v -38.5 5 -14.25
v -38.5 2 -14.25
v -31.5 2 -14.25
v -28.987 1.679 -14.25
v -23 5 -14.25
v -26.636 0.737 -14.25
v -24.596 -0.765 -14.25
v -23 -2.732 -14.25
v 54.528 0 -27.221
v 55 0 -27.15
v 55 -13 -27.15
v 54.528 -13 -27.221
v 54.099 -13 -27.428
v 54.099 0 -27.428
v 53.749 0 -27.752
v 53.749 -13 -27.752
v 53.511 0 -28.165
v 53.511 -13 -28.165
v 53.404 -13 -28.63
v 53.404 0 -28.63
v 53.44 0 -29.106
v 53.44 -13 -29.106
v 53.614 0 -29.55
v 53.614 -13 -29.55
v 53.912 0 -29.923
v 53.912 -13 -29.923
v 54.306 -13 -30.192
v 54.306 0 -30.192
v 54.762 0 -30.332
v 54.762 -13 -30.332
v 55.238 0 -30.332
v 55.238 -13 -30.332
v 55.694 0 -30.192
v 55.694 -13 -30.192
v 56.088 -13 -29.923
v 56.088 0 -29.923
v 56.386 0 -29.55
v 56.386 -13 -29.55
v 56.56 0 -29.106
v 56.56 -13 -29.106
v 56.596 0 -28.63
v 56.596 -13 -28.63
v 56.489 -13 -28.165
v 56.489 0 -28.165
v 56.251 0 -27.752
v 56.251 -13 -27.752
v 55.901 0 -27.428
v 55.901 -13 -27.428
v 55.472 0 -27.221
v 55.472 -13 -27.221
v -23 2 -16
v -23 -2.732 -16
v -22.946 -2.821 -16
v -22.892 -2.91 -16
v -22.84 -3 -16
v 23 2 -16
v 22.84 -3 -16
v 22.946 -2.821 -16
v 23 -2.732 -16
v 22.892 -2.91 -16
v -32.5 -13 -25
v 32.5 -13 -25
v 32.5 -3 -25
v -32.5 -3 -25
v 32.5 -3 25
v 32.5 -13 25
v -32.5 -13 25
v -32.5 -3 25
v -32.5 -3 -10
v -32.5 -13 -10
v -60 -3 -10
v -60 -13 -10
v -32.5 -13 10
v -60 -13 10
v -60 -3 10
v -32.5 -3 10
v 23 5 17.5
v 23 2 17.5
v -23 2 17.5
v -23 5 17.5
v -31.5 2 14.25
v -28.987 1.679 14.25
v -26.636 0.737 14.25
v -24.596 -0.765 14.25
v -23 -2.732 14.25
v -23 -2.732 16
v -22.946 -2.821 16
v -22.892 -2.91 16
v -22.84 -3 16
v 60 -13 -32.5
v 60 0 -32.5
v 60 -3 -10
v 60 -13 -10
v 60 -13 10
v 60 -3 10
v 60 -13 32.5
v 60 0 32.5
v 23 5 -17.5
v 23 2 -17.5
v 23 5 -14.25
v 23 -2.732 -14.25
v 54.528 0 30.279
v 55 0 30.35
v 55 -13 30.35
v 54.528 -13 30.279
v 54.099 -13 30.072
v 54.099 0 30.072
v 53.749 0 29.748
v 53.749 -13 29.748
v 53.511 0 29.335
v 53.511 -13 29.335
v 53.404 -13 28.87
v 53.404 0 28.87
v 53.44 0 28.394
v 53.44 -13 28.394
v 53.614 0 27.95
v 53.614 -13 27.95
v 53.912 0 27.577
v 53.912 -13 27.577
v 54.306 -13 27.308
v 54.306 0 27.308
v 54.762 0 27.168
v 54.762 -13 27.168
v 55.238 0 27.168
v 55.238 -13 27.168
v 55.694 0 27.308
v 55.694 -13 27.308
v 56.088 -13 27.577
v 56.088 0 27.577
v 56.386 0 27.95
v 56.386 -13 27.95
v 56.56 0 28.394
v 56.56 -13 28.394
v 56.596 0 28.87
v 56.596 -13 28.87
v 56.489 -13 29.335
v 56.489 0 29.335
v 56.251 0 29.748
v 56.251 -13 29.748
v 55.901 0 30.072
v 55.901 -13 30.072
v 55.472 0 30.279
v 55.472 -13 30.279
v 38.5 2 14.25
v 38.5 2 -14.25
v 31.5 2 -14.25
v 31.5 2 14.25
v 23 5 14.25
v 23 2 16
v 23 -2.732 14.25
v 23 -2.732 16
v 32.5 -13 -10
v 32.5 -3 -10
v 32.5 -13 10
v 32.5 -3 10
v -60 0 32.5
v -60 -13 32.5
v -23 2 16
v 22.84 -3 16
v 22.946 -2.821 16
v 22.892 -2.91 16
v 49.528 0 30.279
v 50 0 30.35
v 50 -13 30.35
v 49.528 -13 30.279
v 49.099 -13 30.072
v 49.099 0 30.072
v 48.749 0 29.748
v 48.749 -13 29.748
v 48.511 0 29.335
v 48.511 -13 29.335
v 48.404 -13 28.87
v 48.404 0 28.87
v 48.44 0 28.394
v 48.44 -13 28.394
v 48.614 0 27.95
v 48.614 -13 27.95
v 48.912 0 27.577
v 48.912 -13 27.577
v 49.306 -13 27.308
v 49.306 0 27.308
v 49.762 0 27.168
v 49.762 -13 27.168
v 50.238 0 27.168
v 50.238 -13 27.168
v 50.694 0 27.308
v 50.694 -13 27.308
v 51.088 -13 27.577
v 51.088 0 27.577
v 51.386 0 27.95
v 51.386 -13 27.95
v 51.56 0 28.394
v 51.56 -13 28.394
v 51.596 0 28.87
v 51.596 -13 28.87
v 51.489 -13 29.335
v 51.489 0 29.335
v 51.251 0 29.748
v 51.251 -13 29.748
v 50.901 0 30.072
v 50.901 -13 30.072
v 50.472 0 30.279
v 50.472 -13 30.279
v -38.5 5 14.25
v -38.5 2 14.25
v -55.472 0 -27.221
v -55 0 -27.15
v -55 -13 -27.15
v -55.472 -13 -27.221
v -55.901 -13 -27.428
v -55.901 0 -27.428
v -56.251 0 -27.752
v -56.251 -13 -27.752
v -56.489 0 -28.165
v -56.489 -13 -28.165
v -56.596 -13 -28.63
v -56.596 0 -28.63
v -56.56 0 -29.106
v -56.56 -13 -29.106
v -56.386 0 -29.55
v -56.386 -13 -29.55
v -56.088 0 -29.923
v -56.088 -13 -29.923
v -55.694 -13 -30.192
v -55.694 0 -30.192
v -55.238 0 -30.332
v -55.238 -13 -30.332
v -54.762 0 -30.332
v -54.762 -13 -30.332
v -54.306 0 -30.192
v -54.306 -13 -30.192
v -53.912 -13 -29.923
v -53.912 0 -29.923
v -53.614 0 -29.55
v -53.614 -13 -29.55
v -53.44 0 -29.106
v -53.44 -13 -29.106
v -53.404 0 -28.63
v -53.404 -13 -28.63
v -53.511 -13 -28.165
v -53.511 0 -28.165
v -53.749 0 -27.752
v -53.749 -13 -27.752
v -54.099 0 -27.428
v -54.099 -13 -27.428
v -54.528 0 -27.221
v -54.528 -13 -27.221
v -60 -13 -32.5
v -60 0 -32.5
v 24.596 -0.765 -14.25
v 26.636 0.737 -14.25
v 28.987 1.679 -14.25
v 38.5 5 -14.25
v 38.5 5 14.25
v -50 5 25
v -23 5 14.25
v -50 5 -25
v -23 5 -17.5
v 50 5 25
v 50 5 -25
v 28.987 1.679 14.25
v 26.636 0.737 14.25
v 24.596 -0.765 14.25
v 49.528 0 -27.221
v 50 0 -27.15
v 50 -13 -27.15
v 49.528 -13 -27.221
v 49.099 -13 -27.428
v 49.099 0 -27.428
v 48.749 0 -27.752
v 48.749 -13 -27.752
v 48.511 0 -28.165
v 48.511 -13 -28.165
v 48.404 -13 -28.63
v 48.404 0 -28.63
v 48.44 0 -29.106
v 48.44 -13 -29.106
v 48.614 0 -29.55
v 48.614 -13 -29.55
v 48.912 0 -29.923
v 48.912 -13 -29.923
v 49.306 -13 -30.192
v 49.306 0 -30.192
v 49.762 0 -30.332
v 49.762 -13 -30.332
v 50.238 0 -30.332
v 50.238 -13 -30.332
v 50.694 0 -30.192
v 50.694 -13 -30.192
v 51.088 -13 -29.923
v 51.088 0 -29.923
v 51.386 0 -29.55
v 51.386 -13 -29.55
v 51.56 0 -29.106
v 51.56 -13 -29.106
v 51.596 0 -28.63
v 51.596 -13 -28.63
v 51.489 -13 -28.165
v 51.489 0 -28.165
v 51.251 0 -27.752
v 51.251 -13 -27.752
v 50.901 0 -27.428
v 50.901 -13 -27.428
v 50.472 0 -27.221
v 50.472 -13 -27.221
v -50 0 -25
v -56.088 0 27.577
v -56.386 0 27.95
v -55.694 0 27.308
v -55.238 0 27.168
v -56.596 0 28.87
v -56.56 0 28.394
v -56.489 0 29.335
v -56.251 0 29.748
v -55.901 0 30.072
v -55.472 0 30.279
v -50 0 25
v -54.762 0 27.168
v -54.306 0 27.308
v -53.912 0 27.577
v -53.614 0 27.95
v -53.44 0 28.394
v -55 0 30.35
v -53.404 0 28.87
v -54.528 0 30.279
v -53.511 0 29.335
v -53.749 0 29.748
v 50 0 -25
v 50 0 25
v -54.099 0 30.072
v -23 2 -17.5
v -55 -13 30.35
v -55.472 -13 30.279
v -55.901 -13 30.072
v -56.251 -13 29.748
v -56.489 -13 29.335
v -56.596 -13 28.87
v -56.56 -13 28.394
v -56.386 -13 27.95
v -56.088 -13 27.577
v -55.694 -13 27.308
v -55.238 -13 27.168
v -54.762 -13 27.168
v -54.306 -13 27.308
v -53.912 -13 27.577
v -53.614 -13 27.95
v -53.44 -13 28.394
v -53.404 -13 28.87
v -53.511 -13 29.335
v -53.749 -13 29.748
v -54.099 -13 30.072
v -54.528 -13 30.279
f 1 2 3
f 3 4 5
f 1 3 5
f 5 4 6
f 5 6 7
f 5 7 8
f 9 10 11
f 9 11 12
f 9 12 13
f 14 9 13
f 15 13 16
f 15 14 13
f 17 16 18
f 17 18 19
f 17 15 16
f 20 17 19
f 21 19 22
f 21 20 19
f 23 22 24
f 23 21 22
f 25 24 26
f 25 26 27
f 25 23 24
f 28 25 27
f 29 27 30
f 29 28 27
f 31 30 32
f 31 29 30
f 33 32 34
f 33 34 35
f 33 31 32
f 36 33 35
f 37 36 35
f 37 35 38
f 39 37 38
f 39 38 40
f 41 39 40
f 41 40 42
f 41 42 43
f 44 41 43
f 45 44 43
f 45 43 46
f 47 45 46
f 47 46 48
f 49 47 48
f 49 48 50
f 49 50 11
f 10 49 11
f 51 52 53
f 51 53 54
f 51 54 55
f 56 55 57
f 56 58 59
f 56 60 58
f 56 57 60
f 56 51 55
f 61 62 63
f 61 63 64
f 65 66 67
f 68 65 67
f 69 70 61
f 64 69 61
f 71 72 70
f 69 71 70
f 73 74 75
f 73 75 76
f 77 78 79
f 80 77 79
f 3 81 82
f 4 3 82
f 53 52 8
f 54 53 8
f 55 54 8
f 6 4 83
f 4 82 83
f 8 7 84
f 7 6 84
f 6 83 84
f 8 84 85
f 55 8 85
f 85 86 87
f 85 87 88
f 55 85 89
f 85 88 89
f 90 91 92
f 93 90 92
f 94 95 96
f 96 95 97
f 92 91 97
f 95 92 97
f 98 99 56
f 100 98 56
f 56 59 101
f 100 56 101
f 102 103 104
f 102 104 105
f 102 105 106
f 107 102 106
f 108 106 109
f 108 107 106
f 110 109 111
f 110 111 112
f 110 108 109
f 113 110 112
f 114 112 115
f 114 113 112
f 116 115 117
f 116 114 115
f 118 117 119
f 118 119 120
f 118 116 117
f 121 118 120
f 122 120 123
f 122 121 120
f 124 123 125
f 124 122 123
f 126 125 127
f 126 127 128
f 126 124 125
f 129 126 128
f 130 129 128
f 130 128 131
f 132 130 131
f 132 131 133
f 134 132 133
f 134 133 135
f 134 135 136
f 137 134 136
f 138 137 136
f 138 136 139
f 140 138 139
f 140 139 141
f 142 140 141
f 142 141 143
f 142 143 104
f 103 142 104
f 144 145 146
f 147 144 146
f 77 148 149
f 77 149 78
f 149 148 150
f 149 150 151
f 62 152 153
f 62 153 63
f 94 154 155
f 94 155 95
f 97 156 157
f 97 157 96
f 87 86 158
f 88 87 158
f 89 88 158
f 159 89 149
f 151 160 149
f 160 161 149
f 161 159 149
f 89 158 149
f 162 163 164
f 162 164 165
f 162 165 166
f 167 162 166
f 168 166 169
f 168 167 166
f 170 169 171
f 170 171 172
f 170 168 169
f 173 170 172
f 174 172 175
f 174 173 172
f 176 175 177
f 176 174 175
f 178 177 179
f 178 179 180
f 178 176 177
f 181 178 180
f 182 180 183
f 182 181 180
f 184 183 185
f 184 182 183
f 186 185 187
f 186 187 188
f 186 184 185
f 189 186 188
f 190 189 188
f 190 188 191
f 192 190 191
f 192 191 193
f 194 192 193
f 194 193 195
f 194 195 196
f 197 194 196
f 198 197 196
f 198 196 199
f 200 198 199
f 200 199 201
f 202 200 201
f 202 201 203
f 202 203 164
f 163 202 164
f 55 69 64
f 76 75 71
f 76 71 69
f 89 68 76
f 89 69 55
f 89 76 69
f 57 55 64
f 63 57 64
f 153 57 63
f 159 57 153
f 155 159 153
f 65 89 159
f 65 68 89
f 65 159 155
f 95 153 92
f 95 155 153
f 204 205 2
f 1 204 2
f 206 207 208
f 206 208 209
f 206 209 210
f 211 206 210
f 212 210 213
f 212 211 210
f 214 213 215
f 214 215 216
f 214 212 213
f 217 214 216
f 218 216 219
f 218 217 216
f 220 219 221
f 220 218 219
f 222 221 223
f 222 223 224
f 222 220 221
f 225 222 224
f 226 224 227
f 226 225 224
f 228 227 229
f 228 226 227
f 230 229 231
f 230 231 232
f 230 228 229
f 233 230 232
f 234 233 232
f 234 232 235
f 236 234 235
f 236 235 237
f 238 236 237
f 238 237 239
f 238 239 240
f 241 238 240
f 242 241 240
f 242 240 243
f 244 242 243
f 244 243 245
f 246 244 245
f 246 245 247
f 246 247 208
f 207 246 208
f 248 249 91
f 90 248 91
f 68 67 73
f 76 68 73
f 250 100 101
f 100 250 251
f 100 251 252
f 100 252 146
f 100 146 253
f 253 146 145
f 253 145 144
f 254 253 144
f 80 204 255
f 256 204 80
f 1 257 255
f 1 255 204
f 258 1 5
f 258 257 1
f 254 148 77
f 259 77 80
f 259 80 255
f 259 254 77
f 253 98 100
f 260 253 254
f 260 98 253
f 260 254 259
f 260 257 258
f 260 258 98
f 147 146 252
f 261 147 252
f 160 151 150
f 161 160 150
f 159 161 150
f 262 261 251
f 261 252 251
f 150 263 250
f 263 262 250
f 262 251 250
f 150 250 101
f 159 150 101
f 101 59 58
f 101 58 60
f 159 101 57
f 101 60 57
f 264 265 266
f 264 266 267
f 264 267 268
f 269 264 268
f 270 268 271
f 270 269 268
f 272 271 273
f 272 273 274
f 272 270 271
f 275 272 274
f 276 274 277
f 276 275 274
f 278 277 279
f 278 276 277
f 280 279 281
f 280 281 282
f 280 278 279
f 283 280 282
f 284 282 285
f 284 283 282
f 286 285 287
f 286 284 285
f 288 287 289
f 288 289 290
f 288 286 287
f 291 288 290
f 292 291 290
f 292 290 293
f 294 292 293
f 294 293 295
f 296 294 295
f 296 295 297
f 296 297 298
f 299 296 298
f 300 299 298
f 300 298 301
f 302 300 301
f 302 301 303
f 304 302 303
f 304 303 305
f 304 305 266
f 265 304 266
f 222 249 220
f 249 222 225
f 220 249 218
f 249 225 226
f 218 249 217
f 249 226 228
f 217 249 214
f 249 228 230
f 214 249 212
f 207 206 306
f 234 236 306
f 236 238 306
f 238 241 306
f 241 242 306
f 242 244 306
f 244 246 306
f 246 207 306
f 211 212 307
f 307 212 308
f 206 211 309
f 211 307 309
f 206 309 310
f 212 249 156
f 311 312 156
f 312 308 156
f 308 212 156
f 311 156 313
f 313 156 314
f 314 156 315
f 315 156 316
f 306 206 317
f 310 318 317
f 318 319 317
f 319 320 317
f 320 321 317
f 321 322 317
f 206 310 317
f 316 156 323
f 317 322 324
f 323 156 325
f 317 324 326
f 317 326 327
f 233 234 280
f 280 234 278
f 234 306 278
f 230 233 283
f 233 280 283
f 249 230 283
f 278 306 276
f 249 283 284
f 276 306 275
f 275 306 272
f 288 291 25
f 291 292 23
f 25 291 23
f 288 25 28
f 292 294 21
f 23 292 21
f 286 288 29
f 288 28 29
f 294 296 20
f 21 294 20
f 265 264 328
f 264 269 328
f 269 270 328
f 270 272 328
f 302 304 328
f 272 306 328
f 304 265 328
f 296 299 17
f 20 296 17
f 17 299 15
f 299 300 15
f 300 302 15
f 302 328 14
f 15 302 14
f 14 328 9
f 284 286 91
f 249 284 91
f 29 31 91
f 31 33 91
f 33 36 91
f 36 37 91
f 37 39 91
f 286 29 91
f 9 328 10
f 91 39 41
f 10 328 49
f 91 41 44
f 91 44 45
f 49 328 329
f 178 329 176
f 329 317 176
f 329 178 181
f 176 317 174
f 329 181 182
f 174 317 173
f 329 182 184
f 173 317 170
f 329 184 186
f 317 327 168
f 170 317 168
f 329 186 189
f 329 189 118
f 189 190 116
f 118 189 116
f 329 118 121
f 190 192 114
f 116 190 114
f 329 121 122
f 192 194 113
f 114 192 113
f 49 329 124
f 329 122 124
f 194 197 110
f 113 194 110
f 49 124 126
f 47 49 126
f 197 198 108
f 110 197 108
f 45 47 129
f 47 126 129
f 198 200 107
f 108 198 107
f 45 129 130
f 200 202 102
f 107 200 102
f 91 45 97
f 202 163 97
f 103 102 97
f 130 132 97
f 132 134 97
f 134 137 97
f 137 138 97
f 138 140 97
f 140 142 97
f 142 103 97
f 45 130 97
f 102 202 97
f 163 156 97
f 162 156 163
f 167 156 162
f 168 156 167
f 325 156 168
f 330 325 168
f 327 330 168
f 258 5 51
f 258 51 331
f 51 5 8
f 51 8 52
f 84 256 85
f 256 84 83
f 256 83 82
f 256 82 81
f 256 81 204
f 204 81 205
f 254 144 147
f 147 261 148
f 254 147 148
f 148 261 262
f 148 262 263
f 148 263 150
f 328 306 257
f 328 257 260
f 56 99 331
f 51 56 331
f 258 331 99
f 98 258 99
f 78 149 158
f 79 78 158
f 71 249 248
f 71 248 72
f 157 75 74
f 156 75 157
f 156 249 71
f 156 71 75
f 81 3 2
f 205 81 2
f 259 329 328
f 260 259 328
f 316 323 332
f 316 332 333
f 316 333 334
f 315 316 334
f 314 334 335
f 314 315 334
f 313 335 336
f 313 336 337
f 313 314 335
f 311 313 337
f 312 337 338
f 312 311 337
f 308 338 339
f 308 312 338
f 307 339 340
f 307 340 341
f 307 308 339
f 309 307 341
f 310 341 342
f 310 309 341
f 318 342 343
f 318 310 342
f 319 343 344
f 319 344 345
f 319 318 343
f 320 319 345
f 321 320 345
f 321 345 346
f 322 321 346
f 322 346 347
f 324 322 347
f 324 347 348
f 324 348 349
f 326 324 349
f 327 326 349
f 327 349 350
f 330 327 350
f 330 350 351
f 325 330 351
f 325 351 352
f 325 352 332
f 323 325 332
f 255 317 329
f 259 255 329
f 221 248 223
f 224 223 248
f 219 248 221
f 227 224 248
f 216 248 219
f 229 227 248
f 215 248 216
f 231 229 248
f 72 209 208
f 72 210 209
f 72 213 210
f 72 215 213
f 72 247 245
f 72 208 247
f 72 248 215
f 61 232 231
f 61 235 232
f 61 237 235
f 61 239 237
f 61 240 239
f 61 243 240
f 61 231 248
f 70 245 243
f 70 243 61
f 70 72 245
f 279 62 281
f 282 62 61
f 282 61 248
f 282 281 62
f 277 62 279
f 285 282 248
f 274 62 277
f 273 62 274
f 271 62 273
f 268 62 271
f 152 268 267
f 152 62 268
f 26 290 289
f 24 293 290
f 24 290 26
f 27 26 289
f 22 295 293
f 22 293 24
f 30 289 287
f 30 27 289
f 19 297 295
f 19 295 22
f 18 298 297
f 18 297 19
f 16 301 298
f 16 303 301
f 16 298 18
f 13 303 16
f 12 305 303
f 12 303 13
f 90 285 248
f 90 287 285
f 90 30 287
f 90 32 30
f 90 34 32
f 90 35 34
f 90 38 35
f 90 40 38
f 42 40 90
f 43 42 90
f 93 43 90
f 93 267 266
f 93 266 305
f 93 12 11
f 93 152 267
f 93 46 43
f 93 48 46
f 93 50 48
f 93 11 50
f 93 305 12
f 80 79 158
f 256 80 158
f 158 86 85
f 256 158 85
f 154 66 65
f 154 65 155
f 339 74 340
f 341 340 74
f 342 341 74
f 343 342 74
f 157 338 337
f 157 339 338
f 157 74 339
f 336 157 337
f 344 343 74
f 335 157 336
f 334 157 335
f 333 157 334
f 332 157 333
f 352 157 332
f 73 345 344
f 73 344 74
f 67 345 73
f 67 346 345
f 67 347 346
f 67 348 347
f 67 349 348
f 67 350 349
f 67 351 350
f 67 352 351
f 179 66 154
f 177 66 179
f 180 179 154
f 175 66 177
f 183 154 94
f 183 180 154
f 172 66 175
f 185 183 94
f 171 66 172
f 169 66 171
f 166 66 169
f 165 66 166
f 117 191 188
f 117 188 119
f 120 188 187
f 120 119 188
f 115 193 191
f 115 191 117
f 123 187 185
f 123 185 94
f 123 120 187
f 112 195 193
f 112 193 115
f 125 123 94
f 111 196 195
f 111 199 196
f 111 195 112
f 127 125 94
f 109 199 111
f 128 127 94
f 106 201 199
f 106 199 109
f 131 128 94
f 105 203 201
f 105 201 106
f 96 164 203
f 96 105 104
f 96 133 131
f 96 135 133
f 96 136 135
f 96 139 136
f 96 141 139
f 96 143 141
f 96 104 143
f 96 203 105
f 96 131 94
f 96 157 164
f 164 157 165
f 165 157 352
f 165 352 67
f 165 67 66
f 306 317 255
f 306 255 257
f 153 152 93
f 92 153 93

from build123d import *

# Parameters (mm, degrees)
BOSS_EXTRUDE3_DEPTH = 2
SKETCH1_6_W         = 100
SKETCH1_6_H         = 50
BOSS_EXTRUDE4_DEPTH = 5
SKETCH2_W           = 120
SKETCH2_H           = 65
SKETCH2_R           = 1.6
BOSS_EXTRUDE5_DEPTH = 13
SKETCH2_2_W         = 120
SKETCH2_2_H         = 65
SKETCH2_2_R         = 1.6
BOSS_EXTRUDE6_DEPTH = 3
CUT_EXTRUDE1_REACH  = 71.866
SKETCH7_W           = 43
SKETCH7_H           = 32
FILLET1_R           = 10
SKETCH8_W           = 38.5
SKETCH8_H           = 20
CUT_EXTRUDE2_DEPTH  = 10
SKETCH9_W           = 65
SKETCH9_H           = 50
CUT_EXTRUDE3_DEPTH  = 10


with BuildPart() as part:
    # Sketch1 → Boss-Extrude3 (new body)
    with BuildSketch(Plane(origin=(0, 0, 0), x_dir=(1, 0, 0), z_dir=(0, 1, 0))):
        Polygon((23, -14.25), (23, -17.5), (-23, -17.5), (-23, -14.25), (-38.5, -14.25), (-38.5, 14.25), (-23, 14.25), (-23, 17.5), (23, 17.5), (23, 14.25), (38.5, 14.25), (38.5, -14.25), align=None)
    extrude(amount=BOSS_EXTRUDE3_DEPTH)

    # Sketch1<6> → Boss-Extrude4 (add)
    with BuildSketch(Plane(origin=(0, 0, 0), x_dir=(1, 0, 0), z_dir=(0, 1, 0))):
        Rectangle(SKETCH1_6_W, SKETCH1_6_H)
        Polygon((23, -14.25), (23, -17.5), (-23, -17.5), (-23, -14.25), (-38.5, -14.25), (-38.5, 14.25), (-23, 14.25), (-23, 17.5), (23, 17.5), (23, 14.25), (38.5, 14.25), (38.5, -14.25), align=None, mode=Mode.SUBTRACT)
    extrude(amount=BOSS_EXTRUDE4_DEPTH)

    # Sketch2 → Boss-Extrude5 (add)
    with BuildSketch(Plane.XZ):
        Rectangle(SKETCH2_W, SKETCH2_H)
        with Locations(Location((-55, 28.75, 0), (0, 0, 90))):
            Circle(SKETCH2_R, mode=Mode.SUBTRACT)
        with Locations(Location((55, 28.75, 0), (0, 0, 90))):
            Circle(SKETCH2_R, mode=Mode.SUBTRACT)
        with Locations(Location((55, -28.75, 0), (0, 0, 90))):
            Circle(SKETCH2_R, mode=Mode.SUBTRACT)
        with Locations(Location((-55, -28.75, 0), (0, 0, 90))):
            Circle(SKETCH2_R, mode=Mode.SUBTRACT)
        with Locations(Location((50, 28.75, 0), (0, 0, 90))):
            Circle(SKETCH2_R, mode=Mode.SUBTRACT)
        with Locations(Location((50, -28.75, 0), (0, 0, 90))):
            Circle(SKETCH2_R, mode=Mode.SUBTRACT)
    extrude(amount=BOSS_EXTRUDE5_DEPTH)

    # Sketch2<2> → Boss-Extrude6 (add)
    with BuildSketch(Plane.XZ):
        Rectangle(SKETCH2_2_W, SKETCH2_2_H)
        with Locations(Location((-55, 28.75, 0), (0, 0, 90))):
            Circle(SKETCH2_2_R, mode=Mode.SUBTRACT)
        with Locations(Location((55, 28.75, 0), (0, 0, 90))):
            Circle(SKETCH2_2_R, mode=Mode.SUBTRACT)
        with Locations(Location((55, -28.75, 0), (0, 0, 90))):
            Circle(SKETCH2_2_R, mode=Mode.SUBTRACT)
        with Locations(Location((-55, -28.75, 0), (0, 0, 90))):
            Circle(SKETCH2_2_R, mode=Mode.SUBTRACT)
        with Locations(Location((50, 28.75, 0), (0, 0, 90))):
            Circle(SKETCH2_2_R, mode=Mode.SUBTRACT)
        with Locations(Location((50, -28.75, 0), (0, 0, 90))):
            Circle(SKETCH2_2_R, mode=Mode.SUBTRACT)
    extrude(amount=BOSS_EXTRUDE6_DEPTH)

    # Sketch7 → Cut-Extrude1 (cut, up to next)
    with BuildSketch(Plane(origin=(0, 2, 0), x_dir=(1, 0, 0), z_dir=(0, 1, 0)), mode=Mode.PRIVATE) as cut_extrude1_sk1:
        Rectangle(SKETCH7_W, SKETCH7_H)
    cut_extrude1_tool1 = extrude(cut_extrude1_sk1.sketch, amount=-CUT_EXTRUDE1_REACH, mode=Mode.PRIVATE) & part.part
    add(cut_extrude1_tool1.solids().sort_by_distance((0, 2, 0))[0], mode=Mode.SUBTRACT)

    # Fillet1
    # the kernel refuses this fillet: 10 mm, written as the material it takes off along each edge
    with BuildSketch(Plane(origin=(-21.5, 2, 16), x_dir=(0, -1, 0), z_dir=(0, 0, -1))) as fillet1_piece_1_section:
        with BuildLine():
            CenterArc((FILLET1_R, FILLET1_R), FILLET1_R, 180, 90)
            Line((0, FILLET1_R), (0, 0))
            Line((0, 0), (FILLET1_R, 0))
        make_face()
    fillet1_piece_1 = extrude(amount=32, mode=Mode.PRIVATE)
    fillet1_piece_1 = split(fillet1_piece_1, bisect_by=Plane(origin=(-23, -2.387167078, 15.125), z_dir=(1, 0, 0)), keep=Keep.TOP, mode=Mode.PRIVATE)
    add(fillet1_piece_1, mode=Mode.SUBTRACT)
    with BuildSketch(Plane(origin=(-21.5, 2, 41), x_dir=(0, -1, 0), z_dir=(0, 0, -1))) as fillet1_piece_2_section:
        with BuildLine():
            CenterArc((FILLET1_R, FILLET1_R), FILLET1_R, 180, 90)
            Line((0, FILLET1_R), (0, 0))
            Line((0, 0), (FILLET1_R, 0))
        make_face()
    fillet1_piece_2 = extrude(amount=82, mode=Mode.PRIVATE)
    fillet1_piece_2 = split(fillet1_piece_2, bisect_by=Plane(origin=(-23.780995079, -0.852225246, -14.25), z_dir=(0, 0, 1)), keep=Keep.TOP, mode=Mode.PRIVATE)
    fillet1_piece_2 = split(fillet1_piece_2, bisect_by=Plane(origin=(-23.780995079, -0.852225246, 14.25), z_dir=(0, 0, -1)), keep=Keep.TOP, mode=Mode.PRIVATE)
    add(fillet1_piece_2, mode=Mode.SUBTRACT)
    with BuildSketch(Plane(origin=(21.5, 2, -16), x_dir=(0, -1, 0), z_dir=(0, 0, 1))) as fillet1_piece_3_section:
        with BuildLine():
            CenterArc((FILLET1_R, FILLET1_R), FILLET1_R, 180, 90)
            Line((0, FILLET1_R), (0, 0))
            Line((0, 0), (FILLET1_R, 0))
        make_face()
    fillet1_piece_3 = extrude(amount=32, mode=Mode.PRIVATE)
    fillet1_piece_3 = split(fillet1_piece_3, bisect_by=Plane(origin=(23, -2.387167078, -15.125), z_dir=(-1, 0, 0)), keep=Keep.TOP, mode=Mode.PRIVATE)
    add(fillet1_piece_3, mode=Mode.SUBTRACT)
    with BuildSketch(Plane(origin=(21.5, 2, -41), x_dir=(0, -1, 0), z_dir=(0, 0, 1))) as fillet1_piece_4_section:
        with BuildLine():
            CenterArc((FILLET1_R, FILLET1_R), FILLET1_R, 180, 90)
            Line((0, FILLET1_R), (0, 0))
            Line((0, 0), (FILLET1_R, 0))
        make_face()
    fillet1_piece_4 = extrude(amount=82, mode=Mode.PRIVATE)
    fillet1_piece_4 = split(fillet1_piece_4, bisect_by=Plane(origin=(23.780995079, -0.852225246, 14.25), z_dir=(0, 0, -1)), keep=Keep.TOP, mode=Mode.PRIVATE)
    fillet1_piece_4 = split(fillet1_piece_4, bisect_by=Plane(origin=(23.780995079, -0.852225246, -14.25), z_dir=(0, 0, 1)), keep=Keep.TOP, mode=Mode.PRIVATE)
    add(fillet1_piece_4, mode=Mode.SUBTRACT)

    # Sketch8 → Cut-Extrude2 (cut)
    with BuildSketch(Plane.XZ.offset(13)):
        with Locations((-40.75, 0)):
            Rectangle(SKETCH8_W, SKETCH8_H)
        with Locations((40.75, 0)):
            Rectangle(SKETCH8_W, SKETCH8_H)
    extrude(amount=-CUT_EXTRUDE2_DEPTH, mode=Mode.SUBTRACT)

    # Sketch9 → Cut-Extrude3 (cut)
    with BuildSketch(Plane(origin=(0, -13, 0), x_dir=(-1, 0, 0), z_dir=(0, -1, 0))):
        Rectangle(SKETCH9_W, SKETCH9_H)
    extrude(amount=-CUT_EXTRUDE3_DEPTH, mode=Mode.SUBTRACT)


solid = part.part
